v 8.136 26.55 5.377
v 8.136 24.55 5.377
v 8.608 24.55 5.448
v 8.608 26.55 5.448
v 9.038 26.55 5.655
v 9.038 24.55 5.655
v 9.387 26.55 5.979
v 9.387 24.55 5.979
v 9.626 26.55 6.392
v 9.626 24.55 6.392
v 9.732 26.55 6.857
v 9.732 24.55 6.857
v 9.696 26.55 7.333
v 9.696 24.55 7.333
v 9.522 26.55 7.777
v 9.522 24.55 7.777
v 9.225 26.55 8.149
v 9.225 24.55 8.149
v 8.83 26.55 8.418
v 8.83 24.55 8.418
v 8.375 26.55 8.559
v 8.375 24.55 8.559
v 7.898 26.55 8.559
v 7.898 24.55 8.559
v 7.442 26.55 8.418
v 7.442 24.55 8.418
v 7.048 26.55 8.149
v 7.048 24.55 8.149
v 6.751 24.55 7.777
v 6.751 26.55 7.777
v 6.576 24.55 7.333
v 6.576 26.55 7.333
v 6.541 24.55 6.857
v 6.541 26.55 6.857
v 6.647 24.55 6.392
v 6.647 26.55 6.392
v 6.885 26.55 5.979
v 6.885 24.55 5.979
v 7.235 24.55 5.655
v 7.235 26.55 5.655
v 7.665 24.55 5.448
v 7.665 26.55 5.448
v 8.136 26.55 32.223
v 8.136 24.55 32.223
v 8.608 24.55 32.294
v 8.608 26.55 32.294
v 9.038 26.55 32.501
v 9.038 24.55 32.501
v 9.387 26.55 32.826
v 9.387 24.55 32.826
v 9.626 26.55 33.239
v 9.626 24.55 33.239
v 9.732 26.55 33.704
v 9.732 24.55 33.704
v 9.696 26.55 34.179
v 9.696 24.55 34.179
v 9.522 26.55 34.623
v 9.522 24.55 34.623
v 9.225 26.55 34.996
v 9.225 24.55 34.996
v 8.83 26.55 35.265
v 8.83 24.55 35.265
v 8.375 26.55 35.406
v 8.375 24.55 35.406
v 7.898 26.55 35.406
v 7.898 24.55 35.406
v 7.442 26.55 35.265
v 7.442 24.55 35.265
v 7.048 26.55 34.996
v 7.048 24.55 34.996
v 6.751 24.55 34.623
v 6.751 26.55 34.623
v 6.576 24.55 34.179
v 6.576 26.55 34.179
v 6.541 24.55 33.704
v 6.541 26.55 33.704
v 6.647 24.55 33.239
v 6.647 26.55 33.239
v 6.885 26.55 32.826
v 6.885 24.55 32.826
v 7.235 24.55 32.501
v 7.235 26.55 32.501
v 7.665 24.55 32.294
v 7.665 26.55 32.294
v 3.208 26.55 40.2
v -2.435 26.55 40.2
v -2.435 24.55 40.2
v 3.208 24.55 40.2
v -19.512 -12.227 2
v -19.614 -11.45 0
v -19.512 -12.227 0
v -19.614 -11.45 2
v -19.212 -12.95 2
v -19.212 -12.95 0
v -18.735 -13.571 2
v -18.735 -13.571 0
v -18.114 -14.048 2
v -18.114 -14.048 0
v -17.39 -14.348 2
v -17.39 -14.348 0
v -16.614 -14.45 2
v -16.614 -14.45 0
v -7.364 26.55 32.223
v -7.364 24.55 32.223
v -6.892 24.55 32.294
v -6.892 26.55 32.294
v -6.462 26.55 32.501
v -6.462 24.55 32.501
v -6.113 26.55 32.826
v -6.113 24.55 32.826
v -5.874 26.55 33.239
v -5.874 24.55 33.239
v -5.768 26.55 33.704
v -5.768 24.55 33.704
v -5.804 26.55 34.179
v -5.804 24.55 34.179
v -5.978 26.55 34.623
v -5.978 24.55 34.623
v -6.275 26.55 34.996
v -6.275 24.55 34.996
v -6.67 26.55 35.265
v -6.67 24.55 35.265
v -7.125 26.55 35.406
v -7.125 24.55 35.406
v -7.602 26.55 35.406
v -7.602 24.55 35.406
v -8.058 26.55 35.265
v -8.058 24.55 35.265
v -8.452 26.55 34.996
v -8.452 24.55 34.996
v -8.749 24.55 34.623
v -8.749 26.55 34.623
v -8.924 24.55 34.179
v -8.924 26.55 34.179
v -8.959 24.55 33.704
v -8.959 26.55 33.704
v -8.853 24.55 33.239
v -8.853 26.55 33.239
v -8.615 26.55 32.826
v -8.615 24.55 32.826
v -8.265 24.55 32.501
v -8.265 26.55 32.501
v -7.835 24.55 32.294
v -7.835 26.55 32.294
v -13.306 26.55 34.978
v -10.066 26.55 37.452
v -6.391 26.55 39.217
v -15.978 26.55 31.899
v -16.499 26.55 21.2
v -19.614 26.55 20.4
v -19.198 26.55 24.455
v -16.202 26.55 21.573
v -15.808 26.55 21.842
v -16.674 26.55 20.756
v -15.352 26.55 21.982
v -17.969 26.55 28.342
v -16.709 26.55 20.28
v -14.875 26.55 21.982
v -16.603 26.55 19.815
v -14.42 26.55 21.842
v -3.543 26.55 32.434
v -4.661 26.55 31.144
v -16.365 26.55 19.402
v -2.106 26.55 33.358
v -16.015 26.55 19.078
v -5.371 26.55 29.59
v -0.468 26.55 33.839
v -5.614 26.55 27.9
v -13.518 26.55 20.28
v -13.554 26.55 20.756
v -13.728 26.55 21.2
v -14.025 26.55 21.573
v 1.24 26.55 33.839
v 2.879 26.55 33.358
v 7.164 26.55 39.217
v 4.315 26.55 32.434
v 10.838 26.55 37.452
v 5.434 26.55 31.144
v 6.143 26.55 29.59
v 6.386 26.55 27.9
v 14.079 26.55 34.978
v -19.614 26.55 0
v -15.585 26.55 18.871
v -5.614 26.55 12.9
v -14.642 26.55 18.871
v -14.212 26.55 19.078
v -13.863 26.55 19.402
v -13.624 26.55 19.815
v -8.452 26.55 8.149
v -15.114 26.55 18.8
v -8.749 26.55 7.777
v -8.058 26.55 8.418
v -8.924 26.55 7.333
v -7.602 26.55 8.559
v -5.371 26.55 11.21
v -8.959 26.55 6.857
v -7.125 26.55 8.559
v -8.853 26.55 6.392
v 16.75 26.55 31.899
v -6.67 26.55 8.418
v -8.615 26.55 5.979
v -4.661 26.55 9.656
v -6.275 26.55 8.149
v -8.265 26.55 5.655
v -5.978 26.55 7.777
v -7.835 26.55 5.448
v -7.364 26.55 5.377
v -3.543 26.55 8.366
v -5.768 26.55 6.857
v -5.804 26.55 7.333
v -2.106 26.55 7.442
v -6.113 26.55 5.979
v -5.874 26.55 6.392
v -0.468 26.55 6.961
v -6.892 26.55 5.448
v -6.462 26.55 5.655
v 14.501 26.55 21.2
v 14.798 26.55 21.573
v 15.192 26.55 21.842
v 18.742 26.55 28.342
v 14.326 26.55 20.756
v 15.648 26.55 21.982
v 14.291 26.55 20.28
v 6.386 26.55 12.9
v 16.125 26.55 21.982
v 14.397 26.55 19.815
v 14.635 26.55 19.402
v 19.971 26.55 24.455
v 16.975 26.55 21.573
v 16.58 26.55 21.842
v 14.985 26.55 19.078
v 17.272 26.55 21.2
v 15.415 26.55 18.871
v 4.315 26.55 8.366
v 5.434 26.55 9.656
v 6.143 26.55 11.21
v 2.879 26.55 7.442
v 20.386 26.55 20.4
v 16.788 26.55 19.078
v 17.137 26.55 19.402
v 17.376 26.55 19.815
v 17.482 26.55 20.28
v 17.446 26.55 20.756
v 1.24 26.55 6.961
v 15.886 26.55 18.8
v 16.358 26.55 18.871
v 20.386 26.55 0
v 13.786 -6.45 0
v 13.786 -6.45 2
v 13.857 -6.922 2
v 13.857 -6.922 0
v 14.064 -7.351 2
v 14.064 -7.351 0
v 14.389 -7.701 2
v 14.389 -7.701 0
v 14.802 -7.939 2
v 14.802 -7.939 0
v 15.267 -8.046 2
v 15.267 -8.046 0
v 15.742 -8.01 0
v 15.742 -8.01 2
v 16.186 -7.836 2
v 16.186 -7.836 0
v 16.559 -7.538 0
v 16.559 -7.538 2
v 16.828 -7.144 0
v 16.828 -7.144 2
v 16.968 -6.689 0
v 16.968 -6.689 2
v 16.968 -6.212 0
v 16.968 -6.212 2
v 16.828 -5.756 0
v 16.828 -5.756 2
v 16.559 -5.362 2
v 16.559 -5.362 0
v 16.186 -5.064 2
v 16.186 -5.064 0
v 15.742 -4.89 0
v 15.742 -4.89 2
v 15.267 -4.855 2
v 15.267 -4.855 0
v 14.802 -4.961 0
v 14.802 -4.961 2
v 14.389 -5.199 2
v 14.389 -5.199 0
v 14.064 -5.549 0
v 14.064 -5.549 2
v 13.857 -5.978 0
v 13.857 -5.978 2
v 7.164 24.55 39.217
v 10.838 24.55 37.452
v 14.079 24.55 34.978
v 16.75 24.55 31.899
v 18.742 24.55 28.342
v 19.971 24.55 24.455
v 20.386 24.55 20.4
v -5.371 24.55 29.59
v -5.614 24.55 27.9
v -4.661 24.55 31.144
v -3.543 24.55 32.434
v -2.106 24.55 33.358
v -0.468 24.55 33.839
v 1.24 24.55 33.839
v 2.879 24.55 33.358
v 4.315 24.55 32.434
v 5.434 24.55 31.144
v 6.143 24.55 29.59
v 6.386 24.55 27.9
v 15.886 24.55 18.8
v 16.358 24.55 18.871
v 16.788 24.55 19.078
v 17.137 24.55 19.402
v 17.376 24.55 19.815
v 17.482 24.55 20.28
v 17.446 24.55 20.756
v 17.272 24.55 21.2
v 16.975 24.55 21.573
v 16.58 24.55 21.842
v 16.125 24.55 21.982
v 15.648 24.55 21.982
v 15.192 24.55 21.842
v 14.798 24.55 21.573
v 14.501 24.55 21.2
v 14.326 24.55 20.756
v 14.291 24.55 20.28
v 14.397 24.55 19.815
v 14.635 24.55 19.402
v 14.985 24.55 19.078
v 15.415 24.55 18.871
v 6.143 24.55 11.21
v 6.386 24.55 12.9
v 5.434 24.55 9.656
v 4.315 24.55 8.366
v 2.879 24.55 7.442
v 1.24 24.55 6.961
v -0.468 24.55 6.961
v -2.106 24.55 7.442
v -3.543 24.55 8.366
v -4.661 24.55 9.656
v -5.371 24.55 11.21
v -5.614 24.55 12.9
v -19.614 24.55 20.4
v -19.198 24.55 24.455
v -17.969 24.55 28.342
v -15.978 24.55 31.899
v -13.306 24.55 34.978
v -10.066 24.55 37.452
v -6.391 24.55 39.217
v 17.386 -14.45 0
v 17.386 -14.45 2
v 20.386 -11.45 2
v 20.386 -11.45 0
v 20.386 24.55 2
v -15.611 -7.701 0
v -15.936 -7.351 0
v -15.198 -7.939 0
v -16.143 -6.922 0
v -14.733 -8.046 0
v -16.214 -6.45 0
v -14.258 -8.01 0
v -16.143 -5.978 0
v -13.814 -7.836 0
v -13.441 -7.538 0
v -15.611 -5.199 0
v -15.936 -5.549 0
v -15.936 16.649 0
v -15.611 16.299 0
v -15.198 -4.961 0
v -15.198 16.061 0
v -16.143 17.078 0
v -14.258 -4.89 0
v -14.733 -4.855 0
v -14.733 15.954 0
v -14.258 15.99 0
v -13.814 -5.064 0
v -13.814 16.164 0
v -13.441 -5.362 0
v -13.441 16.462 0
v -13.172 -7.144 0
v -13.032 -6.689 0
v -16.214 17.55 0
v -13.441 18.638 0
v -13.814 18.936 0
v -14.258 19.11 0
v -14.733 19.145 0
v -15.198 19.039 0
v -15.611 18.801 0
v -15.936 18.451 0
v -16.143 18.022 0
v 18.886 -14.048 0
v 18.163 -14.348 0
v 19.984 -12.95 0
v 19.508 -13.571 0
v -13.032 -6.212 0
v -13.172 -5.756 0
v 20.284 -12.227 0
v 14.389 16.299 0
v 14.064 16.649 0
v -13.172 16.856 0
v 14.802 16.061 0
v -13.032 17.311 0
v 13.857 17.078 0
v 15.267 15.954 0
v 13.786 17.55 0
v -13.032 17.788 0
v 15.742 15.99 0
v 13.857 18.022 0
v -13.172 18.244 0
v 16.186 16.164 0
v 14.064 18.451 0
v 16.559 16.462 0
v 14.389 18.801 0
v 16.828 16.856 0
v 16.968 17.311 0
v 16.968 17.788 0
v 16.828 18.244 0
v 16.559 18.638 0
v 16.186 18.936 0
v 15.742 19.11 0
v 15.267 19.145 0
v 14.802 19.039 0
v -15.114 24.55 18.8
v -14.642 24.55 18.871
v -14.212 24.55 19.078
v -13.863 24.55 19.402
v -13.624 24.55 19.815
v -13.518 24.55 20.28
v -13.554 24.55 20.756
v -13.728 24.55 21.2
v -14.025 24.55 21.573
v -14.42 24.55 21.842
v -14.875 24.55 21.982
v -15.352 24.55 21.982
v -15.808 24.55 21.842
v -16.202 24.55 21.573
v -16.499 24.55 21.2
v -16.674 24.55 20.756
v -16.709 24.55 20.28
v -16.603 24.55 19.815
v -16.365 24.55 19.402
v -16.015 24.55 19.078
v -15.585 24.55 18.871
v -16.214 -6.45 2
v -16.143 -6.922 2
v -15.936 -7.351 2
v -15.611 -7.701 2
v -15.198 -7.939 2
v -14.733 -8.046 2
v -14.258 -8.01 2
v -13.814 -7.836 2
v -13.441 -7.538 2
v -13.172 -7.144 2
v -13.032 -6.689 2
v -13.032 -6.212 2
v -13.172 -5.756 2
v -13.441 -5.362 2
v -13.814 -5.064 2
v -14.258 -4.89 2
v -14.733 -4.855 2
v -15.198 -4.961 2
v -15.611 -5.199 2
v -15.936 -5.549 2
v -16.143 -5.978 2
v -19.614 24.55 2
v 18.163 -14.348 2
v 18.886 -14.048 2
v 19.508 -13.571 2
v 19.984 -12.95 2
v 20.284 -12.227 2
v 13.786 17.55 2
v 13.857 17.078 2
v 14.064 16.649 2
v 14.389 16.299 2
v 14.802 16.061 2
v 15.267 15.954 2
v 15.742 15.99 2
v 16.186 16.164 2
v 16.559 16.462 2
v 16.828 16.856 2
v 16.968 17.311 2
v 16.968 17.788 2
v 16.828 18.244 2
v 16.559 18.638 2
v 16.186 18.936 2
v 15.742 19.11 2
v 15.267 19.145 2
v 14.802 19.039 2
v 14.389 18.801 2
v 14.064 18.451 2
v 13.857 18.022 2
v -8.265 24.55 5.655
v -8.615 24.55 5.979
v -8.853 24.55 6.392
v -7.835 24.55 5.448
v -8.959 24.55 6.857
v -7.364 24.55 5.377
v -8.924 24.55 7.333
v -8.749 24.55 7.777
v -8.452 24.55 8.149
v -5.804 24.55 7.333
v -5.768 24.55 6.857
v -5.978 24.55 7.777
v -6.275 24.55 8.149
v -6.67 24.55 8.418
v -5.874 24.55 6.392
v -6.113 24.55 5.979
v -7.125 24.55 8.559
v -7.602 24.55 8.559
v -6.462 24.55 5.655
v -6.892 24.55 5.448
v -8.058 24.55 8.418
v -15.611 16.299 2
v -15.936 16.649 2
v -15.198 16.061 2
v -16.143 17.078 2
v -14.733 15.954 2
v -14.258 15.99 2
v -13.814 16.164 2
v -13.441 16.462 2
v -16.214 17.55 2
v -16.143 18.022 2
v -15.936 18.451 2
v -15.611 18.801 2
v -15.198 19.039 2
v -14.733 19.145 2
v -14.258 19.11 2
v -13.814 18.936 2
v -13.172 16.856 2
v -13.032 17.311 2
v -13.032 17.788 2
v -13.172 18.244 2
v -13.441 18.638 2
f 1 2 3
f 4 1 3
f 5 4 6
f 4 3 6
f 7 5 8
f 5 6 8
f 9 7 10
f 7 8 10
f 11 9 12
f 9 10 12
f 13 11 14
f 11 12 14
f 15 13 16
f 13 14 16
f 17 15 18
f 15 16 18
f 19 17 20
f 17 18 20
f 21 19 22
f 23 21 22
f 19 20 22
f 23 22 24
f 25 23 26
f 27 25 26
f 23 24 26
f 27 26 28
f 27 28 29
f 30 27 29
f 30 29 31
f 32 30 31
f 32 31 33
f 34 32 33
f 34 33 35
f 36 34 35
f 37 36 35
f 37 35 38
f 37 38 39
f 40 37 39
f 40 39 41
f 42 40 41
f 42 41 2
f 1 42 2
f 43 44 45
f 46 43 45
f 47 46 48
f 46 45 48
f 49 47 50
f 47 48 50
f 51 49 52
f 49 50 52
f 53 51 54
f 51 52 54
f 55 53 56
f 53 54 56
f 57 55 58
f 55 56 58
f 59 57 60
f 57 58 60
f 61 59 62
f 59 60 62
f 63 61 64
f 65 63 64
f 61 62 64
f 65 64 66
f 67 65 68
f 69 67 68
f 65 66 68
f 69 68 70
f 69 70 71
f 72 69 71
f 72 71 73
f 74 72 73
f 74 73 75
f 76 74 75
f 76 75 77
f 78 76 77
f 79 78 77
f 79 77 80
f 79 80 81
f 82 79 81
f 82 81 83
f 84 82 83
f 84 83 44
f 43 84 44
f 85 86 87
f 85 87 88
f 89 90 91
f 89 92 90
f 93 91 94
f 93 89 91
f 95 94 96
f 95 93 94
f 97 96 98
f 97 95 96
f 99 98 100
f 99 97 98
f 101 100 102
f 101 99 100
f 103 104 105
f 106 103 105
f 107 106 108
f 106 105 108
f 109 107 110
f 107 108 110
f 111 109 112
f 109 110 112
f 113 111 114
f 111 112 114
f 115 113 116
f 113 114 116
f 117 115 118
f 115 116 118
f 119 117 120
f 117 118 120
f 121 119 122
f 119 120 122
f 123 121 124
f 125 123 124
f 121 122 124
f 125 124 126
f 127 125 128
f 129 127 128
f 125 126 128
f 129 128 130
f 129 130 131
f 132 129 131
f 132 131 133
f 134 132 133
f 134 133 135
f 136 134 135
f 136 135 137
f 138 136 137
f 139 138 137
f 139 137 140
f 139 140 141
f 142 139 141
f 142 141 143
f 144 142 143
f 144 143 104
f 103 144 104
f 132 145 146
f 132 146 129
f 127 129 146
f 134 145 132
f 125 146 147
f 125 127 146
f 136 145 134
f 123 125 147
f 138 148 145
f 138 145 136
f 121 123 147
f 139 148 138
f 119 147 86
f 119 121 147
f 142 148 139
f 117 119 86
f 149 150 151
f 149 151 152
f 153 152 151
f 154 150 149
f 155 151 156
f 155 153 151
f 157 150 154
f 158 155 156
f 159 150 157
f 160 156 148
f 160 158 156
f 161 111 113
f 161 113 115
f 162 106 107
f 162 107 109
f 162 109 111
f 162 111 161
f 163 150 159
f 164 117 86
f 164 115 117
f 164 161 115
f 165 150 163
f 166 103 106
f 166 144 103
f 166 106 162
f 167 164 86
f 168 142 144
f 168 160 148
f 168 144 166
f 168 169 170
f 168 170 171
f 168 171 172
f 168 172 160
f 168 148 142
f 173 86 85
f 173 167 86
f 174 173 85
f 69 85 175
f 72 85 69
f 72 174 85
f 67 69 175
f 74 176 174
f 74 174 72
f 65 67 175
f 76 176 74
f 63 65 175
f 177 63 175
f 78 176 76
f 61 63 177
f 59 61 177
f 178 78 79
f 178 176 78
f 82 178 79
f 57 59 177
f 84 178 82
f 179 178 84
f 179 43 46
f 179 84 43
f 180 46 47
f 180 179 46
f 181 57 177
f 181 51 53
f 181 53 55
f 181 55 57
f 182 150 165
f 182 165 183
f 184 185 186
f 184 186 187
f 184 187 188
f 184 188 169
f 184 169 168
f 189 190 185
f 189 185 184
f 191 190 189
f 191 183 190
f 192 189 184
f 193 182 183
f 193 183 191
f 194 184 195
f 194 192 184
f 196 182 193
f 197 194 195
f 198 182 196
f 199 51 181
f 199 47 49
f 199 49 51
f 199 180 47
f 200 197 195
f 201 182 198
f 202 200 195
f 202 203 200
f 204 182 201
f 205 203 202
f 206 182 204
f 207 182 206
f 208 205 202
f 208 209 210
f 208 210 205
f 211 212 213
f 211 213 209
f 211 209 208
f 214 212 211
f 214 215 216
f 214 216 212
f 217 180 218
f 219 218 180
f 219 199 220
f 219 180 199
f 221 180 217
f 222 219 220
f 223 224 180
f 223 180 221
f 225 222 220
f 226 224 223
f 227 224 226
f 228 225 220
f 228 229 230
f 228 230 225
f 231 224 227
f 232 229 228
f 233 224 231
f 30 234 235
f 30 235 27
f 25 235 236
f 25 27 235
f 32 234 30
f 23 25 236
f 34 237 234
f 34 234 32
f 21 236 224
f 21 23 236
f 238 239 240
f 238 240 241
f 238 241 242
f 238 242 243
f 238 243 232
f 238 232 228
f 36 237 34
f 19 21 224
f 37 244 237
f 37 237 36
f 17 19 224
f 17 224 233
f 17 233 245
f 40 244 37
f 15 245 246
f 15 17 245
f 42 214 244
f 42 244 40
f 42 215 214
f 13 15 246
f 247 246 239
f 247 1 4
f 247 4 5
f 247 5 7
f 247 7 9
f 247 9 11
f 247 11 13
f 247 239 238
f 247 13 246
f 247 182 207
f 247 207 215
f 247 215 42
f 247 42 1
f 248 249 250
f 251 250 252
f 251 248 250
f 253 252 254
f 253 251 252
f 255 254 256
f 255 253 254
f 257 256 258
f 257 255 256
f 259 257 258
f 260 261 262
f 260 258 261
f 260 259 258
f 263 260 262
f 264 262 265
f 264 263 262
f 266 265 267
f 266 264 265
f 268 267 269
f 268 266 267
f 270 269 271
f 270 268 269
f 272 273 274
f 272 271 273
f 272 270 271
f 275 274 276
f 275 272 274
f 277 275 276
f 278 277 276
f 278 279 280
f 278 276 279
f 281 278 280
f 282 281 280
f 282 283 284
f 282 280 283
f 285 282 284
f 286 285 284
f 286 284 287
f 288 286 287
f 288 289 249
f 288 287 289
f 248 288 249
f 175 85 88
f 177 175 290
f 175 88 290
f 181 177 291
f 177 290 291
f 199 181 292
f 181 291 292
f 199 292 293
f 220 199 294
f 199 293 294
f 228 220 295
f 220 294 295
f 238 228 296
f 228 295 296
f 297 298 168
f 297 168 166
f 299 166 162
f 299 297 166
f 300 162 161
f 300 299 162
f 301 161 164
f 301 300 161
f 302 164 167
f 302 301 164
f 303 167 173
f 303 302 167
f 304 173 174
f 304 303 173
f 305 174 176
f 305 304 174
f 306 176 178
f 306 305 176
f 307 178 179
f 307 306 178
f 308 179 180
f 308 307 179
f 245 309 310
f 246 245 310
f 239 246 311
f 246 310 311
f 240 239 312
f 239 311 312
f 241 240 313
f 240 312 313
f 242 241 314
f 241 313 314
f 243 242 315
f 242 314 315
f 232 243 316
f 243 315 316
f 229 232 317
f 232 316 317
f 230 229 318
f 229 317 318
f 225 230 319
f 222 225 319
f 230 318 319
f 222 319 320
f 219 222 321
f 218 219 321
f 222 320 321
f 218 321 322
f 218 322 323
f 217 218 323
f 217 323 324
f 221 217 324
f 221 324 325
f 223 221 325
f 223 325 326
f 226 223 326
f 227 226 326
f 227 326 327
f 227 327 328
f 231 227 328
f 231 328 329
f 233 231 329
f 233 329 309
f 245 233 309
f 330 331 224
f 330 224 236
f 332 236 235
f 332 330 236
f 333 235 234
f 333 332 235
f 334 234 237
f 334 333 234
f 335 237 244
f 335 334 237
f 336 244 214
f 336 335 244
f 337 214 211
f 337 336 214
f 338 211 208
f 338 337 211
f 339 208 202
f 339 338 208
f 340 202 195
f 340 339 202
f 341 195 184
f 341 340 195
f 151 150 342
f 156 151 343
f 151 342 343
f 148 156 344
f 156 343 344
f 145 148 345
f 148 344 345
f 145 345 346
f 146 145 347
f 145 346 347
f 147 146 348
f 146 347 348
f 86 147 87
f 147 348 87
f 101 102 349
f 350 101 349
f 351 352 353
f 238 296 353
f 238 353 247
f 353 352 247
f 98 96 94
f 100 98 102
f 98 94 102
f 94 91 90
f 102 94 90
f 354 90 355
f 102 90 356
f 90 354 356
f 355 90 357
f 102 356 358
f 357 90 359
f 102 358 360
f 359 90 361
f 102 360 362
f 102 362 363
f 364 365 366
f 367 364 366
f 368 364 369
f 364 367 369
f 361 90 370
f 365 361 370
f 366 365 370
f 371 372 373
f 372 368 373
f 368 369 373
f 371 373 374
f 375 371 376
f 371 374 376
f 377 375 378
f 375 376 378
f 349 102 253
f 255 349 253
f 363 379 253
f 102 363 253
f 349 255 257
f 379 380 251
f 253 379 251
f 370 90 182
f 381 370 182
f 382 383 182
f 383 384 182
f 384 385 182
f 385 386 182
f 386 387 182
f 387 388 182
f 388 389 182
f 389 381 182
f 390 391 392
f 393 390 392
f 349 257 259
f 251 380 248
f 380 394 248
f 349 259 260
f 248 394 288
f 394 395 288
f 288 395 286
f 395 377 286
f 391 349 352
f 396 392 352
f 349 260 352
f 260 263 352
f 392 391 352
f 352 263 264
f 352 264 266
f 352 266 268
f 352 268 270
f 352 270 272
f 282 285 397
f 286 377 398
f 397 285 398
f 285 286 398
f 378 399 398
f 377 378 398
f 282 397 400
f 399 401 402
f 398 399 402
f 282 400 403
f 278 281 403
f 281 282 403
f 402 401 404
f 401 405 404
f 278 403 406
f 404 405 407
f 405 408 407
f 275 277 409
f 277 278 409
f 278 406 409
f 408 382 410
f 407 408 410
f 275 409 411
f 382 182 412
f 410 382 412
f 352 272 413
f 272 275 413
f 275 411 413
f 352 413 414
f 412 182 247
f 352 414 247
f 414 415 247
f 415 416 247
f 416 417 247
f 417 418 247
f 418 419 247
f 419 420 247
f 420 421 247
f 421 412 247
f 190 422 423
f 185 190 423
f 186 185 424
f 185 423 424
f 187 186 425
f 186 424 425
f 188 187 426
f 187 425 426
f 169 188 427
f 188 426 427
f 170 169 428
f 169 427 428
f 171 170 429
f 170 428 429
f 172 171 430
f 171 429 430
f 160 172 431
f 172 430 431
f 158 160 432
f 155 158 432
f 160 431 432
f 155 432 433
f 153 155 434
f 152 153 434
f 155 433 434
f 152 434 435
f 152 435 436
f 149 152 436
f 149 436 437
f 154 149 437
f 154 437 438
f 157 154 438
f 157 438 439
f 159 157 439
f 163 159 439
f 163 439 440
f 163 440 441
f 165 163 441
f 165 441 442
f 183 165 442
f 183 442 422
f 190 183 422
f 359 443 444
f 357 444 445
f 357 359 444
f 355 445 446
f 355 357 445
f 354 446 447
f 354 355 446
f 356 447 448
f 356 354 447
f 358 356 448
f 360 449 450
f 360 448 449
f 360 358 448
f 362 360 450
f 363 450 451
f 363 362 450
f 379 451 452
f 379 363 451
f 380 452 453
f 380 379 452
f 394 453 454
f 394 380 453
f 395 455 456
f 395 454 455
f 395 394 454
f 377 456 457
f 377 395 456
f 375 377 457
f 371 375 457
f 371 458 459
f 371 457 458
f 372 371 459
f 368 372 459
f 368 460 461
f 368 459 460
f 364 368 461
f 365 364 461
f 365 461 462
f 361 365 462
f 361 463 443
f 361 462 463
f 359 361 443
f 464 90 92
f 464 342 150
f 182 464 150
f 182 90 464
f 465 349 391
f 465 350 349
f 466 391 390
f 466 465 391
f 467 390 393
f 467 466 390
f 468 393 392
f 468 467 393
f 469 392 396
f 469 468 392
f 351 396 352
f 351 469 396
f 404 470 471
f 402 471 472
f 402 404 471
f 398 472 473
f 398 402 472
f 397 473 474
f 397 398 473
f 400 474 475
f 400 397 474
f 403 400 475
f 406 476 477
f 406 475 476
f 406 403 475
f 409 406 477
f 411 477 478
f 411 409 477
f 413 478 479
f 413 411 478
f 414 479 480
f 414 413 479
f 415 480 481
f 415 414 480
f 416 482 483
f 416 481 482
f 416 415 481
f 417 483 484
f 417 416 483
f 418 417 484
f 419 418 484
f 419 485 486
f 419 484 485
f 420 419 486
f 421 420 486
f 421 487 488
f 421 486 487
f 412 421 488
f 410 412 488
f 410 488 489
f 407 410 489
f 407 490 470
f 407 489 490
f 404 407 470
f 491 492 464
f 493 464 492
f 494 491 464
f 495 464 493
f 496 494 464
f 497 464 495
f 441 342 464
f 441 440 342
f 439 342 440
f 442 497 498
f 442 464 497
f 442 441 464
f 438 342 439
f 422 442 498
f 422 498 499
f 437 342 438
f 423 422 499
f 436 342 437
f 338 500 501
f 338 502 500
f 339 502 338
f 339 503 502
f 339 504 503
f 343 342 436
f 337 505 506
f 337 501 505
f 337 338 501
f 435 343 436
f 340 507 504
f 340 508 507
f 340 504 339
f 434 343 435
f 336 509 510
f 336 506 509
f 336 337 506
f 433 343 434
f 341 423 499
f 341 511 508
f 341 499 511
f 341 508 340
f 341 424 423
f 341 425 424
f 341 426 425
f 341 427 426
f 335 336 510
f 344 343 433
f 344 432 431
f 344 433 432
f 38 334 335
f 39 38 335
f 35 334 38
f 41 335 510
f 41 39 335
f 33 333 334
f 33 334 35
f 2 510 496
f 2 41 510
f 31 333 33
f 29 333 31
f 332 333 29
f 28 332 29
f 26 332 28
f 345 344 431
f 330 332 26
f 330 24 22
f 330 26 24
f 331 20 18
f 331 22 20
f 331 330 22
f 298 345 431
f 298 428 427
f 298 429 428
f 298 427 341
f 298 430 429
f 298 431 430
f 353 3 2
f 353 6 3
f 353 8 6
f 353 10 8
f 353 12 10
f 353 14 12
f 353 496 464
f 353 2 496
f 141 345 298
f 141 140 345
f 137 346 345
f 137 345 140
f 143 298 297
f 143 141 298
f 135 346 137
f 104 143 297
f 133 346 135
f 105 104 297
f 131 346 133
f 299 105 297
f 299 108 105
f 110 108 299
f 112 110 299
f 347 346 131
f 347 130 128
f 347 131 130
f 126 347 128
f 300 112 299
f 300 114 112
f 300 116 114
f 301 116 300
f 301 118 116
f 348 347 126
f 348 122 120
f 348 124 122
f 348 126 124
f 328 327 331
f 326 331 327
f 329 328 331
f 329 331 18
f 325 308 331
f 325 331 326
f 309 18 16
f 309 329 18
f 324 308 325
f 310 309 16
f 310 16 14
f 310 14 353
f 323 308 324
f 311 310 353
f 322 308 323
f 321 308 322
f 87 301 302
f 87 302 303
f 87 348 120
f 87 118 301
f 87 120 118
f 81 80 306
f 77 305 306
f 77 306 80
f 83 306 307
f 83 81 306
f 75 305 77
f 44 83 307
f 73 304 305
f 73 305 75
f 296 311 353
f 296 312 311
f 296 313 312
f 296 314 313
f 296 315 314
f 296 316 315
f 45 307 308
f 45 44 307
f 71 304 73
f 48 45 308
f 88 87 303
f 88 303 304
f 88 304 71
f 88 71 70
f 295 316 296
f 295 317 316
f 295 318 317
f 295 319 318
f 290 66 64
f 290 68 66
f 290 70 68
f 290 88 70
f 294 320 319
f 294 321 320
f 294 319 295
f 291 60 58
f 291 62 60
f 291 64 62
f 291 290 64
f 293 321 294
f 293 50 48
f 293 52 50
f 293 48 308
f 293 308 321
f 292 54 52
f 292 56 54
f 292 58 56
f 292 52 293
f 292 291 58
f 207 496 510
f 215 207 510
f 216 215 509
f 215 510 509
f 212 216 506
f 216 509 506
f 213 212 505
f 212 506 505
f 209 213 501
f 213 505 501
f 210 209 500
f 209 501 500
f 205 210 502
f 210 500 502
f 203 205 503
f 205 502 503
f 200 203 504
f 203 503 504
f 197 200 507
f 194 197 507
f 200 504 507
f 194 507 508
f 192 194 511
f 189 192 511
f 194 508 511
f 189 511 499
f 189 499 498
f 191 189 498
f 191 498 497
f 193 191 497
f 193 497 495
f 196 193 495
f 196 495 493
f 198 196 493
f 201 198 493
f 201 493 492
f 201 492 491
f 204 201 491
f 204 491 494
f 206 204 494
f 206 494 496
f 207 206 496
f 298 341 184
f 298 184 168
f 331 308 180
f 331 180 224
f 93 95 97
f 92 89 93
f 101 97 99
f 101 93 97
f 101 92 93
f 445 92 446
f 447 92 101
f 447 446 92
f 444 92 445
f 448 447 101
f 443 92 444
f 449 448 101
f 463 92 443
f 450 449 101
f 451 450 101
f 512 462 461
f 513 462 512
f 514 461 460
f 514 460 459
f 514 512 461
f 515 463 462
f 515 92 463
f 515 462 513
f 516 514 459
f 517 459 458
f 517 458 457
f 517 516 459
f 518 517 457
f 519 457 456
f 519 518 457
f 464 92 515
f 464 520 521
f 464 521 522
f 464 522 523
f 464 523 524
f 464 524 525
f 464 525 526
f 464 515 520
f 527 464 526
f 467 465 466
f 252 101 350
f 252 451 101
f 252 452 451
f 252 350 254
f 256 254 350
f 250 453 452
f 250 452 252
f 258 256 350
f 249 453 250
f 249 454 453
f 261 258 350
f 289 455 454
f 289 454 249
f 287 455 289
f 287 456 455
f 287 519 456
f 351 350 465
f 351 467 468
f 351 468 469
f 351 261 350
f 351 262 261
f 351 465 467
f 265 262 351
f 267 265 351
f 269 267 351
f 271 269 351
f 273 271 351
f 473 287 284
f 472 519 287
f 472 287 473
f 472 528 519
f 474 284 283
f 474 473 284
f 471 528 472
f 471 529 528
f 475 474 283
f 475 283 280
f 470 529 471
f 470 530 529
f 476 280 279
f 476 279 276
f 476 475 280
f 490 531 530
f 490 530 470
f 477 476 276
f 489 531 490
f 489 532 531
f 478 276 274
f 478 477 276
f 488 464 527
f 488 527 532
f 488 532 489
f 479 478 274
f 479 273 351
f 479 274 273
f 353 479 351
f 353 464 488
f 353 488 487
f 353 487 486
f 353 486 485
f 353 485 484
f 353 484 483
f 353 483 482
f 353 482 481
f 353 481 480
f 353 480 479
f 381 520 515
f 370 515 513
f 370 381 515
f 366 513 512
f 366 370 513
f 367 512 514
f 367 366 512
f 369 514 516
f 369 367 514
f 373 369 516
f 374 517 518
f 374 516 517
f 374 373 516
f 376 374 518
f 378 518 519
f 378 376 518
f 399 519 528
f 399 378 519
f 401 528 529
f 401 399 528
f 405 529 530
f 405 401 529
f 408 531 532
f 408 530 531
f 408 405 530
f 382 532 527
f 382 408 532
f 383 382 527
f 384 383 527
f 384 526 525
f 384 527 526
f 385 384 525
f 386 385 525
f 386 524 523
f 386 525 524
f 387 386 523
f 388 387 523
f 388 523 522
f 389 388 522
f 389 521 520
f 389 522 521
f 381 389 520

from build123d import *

# Parameters (mm, degrees)
SKETCH_2_W          = 40
SKETCH_2_H          = 41
SKETCH_2_R          = 1.6
EXTRUDE_1_DEPTH     = 40.2
SKETCH_3_W          = 40
SKETCH_3_H          = 39
CUT_EXTRUDE_1_DEPTH = 38.2
CUT_EXTRUDE_2_DEPTH = 60.604020905
SKETCH_5_R          = 1.6
CUT_EXTRUDE_3_DEPTH = 60.604020905
FILLET_1_R          = 3


with BuildPart() as part:
    # 草图2 → 凸台-拉伸1 (new body)
    with BuildSketch(Plane.XY):
        with Locations((0.386252919, 6.049930002)):
            Rectangle(SKETCH_2_W, SKETCH_2_H)
        with Locations(Location((-14.613747081, -6.450069998, 0), (0, 0, 180))):
            Circle(SKETCH_2_R, mode=Mode.SUBTRACT)
        with Locations(Location((15.386252919, -6.450069998, 0), (0, 0, 180))):
            Circle(SKETCH_2_R, mode=Mode.SUBTRACT)
        with Locations(Location((-14.613747081, 17.549930002, 0), (0, 0, 180))):
            Circle(SKETCH_2_R, mode=Mode.SUBTRACT)
        with Locations(Location((15.386252919, 17.549930002, 0), (0, 0, 180))):
            Circle(SKETCH_2_R, mode=Mode.SUBTRACT)
    extrude(amount=EXTRUDE_1_DEPTH)

    # 草图3 → 切除-拉伸1 (cut)
    with BuildSketch(Plane.XY.offset(40.2)):
        with Locations((0.386252919, 5.049930002)):
            Rectangle(SKETCH_3_W, SKETCH_3_H)
    extrude(amount=-CUT_EXTRUDE_1_DEPTH, mode=Mode.SUBTRACT)

    # 草图4 → 切除-拉伸2 (cut, through all)
    with BuildSketch(Plane.XZ.offset(-24.549930002)):
        with BuildLine():
            Line((-2.435094277, 40.2), (-19.613747081, 40.2))
            Line((-19.613747081, 40.2), (-19.613747081, 20.4))
            ThreePointArc((-19.613747081, 20.4), (-14.720483061, 33.50673598), (-2.435094277, 40.2))
        make_face()
        with BuildLine():
            Line((20.386252919, 40.2), (3.207600115, 40.2))
            ThreePointArc((3.207600115, 40.2), (15.492988899, 33.50673598), (20.386252919, 20.4))
            Line((20.386252919, 20.4), (20.386252919, 40.2))
        make_face()
    extrude(amount=-CUT_EXTRUDE_2_DEPTH, mode=Mode.SUBTRACT)

    # 草图5 → 切除-拉伸3 (cut, through all)
    with BuildSketch(Plane.XZ.offset(-24.549930002)):
        with Locations(Location((-15.113747081, 20.4, 0), (0, 0, 270))):
            Circle(SKETCH_5_R)
        with Locations(Location((15.886252919, 20.4, 0), (0, 0, 270))):
            Circle(SKETCH_5_R)
        with Locations(Location((-7.363747081, 33.823393759, 0), (0, 0, 270))):
            Circle(SKETCH_5_R)
        with Locations(Location((8.136252919, 33.823393759, 0), (0, 0, 270))):
            Circle(SKETCH_5_R)
        with Locations(Location((-7.363747081, 6.976606241, 0), (0, 0, 270))):
            Circle(SKETCH_5_R)
        with Locations(Location((8.136252919, 6.976606241, 0), (0, 0, 270))):
            Circle(SKETCH_5_R)
        with BuildLine():
            Line((-5.613747081, 12.9), (-5.613747081, 27.9))
            ThreePointArc((-5.613747081, 27.9), (0.386252919, 33.9), (6.386252919, 27.9))
            Line((6.386252919, 27.9), (6.386252919, 12.9))
            ThreePointArc((6.386252919, 12.9), (0.386252919, 6.9), (-5.613747081, 12.9))
        make_face()
    extrude(amount=-CUT_EXTRUDE_3_DEPTH, mode=Mode.SUBTRACT)

    # 圆角1
    fillet_1_edges = [part.edges().sort_by_distance(p)[0] for p in [
        (20.386252919, -14.450069998, 1),
        (-19.613747081, -14.450069998, 1),
    ]]
    fillet(fillet_1_edges, radius=FILLET_1_R)


solid = part.part
